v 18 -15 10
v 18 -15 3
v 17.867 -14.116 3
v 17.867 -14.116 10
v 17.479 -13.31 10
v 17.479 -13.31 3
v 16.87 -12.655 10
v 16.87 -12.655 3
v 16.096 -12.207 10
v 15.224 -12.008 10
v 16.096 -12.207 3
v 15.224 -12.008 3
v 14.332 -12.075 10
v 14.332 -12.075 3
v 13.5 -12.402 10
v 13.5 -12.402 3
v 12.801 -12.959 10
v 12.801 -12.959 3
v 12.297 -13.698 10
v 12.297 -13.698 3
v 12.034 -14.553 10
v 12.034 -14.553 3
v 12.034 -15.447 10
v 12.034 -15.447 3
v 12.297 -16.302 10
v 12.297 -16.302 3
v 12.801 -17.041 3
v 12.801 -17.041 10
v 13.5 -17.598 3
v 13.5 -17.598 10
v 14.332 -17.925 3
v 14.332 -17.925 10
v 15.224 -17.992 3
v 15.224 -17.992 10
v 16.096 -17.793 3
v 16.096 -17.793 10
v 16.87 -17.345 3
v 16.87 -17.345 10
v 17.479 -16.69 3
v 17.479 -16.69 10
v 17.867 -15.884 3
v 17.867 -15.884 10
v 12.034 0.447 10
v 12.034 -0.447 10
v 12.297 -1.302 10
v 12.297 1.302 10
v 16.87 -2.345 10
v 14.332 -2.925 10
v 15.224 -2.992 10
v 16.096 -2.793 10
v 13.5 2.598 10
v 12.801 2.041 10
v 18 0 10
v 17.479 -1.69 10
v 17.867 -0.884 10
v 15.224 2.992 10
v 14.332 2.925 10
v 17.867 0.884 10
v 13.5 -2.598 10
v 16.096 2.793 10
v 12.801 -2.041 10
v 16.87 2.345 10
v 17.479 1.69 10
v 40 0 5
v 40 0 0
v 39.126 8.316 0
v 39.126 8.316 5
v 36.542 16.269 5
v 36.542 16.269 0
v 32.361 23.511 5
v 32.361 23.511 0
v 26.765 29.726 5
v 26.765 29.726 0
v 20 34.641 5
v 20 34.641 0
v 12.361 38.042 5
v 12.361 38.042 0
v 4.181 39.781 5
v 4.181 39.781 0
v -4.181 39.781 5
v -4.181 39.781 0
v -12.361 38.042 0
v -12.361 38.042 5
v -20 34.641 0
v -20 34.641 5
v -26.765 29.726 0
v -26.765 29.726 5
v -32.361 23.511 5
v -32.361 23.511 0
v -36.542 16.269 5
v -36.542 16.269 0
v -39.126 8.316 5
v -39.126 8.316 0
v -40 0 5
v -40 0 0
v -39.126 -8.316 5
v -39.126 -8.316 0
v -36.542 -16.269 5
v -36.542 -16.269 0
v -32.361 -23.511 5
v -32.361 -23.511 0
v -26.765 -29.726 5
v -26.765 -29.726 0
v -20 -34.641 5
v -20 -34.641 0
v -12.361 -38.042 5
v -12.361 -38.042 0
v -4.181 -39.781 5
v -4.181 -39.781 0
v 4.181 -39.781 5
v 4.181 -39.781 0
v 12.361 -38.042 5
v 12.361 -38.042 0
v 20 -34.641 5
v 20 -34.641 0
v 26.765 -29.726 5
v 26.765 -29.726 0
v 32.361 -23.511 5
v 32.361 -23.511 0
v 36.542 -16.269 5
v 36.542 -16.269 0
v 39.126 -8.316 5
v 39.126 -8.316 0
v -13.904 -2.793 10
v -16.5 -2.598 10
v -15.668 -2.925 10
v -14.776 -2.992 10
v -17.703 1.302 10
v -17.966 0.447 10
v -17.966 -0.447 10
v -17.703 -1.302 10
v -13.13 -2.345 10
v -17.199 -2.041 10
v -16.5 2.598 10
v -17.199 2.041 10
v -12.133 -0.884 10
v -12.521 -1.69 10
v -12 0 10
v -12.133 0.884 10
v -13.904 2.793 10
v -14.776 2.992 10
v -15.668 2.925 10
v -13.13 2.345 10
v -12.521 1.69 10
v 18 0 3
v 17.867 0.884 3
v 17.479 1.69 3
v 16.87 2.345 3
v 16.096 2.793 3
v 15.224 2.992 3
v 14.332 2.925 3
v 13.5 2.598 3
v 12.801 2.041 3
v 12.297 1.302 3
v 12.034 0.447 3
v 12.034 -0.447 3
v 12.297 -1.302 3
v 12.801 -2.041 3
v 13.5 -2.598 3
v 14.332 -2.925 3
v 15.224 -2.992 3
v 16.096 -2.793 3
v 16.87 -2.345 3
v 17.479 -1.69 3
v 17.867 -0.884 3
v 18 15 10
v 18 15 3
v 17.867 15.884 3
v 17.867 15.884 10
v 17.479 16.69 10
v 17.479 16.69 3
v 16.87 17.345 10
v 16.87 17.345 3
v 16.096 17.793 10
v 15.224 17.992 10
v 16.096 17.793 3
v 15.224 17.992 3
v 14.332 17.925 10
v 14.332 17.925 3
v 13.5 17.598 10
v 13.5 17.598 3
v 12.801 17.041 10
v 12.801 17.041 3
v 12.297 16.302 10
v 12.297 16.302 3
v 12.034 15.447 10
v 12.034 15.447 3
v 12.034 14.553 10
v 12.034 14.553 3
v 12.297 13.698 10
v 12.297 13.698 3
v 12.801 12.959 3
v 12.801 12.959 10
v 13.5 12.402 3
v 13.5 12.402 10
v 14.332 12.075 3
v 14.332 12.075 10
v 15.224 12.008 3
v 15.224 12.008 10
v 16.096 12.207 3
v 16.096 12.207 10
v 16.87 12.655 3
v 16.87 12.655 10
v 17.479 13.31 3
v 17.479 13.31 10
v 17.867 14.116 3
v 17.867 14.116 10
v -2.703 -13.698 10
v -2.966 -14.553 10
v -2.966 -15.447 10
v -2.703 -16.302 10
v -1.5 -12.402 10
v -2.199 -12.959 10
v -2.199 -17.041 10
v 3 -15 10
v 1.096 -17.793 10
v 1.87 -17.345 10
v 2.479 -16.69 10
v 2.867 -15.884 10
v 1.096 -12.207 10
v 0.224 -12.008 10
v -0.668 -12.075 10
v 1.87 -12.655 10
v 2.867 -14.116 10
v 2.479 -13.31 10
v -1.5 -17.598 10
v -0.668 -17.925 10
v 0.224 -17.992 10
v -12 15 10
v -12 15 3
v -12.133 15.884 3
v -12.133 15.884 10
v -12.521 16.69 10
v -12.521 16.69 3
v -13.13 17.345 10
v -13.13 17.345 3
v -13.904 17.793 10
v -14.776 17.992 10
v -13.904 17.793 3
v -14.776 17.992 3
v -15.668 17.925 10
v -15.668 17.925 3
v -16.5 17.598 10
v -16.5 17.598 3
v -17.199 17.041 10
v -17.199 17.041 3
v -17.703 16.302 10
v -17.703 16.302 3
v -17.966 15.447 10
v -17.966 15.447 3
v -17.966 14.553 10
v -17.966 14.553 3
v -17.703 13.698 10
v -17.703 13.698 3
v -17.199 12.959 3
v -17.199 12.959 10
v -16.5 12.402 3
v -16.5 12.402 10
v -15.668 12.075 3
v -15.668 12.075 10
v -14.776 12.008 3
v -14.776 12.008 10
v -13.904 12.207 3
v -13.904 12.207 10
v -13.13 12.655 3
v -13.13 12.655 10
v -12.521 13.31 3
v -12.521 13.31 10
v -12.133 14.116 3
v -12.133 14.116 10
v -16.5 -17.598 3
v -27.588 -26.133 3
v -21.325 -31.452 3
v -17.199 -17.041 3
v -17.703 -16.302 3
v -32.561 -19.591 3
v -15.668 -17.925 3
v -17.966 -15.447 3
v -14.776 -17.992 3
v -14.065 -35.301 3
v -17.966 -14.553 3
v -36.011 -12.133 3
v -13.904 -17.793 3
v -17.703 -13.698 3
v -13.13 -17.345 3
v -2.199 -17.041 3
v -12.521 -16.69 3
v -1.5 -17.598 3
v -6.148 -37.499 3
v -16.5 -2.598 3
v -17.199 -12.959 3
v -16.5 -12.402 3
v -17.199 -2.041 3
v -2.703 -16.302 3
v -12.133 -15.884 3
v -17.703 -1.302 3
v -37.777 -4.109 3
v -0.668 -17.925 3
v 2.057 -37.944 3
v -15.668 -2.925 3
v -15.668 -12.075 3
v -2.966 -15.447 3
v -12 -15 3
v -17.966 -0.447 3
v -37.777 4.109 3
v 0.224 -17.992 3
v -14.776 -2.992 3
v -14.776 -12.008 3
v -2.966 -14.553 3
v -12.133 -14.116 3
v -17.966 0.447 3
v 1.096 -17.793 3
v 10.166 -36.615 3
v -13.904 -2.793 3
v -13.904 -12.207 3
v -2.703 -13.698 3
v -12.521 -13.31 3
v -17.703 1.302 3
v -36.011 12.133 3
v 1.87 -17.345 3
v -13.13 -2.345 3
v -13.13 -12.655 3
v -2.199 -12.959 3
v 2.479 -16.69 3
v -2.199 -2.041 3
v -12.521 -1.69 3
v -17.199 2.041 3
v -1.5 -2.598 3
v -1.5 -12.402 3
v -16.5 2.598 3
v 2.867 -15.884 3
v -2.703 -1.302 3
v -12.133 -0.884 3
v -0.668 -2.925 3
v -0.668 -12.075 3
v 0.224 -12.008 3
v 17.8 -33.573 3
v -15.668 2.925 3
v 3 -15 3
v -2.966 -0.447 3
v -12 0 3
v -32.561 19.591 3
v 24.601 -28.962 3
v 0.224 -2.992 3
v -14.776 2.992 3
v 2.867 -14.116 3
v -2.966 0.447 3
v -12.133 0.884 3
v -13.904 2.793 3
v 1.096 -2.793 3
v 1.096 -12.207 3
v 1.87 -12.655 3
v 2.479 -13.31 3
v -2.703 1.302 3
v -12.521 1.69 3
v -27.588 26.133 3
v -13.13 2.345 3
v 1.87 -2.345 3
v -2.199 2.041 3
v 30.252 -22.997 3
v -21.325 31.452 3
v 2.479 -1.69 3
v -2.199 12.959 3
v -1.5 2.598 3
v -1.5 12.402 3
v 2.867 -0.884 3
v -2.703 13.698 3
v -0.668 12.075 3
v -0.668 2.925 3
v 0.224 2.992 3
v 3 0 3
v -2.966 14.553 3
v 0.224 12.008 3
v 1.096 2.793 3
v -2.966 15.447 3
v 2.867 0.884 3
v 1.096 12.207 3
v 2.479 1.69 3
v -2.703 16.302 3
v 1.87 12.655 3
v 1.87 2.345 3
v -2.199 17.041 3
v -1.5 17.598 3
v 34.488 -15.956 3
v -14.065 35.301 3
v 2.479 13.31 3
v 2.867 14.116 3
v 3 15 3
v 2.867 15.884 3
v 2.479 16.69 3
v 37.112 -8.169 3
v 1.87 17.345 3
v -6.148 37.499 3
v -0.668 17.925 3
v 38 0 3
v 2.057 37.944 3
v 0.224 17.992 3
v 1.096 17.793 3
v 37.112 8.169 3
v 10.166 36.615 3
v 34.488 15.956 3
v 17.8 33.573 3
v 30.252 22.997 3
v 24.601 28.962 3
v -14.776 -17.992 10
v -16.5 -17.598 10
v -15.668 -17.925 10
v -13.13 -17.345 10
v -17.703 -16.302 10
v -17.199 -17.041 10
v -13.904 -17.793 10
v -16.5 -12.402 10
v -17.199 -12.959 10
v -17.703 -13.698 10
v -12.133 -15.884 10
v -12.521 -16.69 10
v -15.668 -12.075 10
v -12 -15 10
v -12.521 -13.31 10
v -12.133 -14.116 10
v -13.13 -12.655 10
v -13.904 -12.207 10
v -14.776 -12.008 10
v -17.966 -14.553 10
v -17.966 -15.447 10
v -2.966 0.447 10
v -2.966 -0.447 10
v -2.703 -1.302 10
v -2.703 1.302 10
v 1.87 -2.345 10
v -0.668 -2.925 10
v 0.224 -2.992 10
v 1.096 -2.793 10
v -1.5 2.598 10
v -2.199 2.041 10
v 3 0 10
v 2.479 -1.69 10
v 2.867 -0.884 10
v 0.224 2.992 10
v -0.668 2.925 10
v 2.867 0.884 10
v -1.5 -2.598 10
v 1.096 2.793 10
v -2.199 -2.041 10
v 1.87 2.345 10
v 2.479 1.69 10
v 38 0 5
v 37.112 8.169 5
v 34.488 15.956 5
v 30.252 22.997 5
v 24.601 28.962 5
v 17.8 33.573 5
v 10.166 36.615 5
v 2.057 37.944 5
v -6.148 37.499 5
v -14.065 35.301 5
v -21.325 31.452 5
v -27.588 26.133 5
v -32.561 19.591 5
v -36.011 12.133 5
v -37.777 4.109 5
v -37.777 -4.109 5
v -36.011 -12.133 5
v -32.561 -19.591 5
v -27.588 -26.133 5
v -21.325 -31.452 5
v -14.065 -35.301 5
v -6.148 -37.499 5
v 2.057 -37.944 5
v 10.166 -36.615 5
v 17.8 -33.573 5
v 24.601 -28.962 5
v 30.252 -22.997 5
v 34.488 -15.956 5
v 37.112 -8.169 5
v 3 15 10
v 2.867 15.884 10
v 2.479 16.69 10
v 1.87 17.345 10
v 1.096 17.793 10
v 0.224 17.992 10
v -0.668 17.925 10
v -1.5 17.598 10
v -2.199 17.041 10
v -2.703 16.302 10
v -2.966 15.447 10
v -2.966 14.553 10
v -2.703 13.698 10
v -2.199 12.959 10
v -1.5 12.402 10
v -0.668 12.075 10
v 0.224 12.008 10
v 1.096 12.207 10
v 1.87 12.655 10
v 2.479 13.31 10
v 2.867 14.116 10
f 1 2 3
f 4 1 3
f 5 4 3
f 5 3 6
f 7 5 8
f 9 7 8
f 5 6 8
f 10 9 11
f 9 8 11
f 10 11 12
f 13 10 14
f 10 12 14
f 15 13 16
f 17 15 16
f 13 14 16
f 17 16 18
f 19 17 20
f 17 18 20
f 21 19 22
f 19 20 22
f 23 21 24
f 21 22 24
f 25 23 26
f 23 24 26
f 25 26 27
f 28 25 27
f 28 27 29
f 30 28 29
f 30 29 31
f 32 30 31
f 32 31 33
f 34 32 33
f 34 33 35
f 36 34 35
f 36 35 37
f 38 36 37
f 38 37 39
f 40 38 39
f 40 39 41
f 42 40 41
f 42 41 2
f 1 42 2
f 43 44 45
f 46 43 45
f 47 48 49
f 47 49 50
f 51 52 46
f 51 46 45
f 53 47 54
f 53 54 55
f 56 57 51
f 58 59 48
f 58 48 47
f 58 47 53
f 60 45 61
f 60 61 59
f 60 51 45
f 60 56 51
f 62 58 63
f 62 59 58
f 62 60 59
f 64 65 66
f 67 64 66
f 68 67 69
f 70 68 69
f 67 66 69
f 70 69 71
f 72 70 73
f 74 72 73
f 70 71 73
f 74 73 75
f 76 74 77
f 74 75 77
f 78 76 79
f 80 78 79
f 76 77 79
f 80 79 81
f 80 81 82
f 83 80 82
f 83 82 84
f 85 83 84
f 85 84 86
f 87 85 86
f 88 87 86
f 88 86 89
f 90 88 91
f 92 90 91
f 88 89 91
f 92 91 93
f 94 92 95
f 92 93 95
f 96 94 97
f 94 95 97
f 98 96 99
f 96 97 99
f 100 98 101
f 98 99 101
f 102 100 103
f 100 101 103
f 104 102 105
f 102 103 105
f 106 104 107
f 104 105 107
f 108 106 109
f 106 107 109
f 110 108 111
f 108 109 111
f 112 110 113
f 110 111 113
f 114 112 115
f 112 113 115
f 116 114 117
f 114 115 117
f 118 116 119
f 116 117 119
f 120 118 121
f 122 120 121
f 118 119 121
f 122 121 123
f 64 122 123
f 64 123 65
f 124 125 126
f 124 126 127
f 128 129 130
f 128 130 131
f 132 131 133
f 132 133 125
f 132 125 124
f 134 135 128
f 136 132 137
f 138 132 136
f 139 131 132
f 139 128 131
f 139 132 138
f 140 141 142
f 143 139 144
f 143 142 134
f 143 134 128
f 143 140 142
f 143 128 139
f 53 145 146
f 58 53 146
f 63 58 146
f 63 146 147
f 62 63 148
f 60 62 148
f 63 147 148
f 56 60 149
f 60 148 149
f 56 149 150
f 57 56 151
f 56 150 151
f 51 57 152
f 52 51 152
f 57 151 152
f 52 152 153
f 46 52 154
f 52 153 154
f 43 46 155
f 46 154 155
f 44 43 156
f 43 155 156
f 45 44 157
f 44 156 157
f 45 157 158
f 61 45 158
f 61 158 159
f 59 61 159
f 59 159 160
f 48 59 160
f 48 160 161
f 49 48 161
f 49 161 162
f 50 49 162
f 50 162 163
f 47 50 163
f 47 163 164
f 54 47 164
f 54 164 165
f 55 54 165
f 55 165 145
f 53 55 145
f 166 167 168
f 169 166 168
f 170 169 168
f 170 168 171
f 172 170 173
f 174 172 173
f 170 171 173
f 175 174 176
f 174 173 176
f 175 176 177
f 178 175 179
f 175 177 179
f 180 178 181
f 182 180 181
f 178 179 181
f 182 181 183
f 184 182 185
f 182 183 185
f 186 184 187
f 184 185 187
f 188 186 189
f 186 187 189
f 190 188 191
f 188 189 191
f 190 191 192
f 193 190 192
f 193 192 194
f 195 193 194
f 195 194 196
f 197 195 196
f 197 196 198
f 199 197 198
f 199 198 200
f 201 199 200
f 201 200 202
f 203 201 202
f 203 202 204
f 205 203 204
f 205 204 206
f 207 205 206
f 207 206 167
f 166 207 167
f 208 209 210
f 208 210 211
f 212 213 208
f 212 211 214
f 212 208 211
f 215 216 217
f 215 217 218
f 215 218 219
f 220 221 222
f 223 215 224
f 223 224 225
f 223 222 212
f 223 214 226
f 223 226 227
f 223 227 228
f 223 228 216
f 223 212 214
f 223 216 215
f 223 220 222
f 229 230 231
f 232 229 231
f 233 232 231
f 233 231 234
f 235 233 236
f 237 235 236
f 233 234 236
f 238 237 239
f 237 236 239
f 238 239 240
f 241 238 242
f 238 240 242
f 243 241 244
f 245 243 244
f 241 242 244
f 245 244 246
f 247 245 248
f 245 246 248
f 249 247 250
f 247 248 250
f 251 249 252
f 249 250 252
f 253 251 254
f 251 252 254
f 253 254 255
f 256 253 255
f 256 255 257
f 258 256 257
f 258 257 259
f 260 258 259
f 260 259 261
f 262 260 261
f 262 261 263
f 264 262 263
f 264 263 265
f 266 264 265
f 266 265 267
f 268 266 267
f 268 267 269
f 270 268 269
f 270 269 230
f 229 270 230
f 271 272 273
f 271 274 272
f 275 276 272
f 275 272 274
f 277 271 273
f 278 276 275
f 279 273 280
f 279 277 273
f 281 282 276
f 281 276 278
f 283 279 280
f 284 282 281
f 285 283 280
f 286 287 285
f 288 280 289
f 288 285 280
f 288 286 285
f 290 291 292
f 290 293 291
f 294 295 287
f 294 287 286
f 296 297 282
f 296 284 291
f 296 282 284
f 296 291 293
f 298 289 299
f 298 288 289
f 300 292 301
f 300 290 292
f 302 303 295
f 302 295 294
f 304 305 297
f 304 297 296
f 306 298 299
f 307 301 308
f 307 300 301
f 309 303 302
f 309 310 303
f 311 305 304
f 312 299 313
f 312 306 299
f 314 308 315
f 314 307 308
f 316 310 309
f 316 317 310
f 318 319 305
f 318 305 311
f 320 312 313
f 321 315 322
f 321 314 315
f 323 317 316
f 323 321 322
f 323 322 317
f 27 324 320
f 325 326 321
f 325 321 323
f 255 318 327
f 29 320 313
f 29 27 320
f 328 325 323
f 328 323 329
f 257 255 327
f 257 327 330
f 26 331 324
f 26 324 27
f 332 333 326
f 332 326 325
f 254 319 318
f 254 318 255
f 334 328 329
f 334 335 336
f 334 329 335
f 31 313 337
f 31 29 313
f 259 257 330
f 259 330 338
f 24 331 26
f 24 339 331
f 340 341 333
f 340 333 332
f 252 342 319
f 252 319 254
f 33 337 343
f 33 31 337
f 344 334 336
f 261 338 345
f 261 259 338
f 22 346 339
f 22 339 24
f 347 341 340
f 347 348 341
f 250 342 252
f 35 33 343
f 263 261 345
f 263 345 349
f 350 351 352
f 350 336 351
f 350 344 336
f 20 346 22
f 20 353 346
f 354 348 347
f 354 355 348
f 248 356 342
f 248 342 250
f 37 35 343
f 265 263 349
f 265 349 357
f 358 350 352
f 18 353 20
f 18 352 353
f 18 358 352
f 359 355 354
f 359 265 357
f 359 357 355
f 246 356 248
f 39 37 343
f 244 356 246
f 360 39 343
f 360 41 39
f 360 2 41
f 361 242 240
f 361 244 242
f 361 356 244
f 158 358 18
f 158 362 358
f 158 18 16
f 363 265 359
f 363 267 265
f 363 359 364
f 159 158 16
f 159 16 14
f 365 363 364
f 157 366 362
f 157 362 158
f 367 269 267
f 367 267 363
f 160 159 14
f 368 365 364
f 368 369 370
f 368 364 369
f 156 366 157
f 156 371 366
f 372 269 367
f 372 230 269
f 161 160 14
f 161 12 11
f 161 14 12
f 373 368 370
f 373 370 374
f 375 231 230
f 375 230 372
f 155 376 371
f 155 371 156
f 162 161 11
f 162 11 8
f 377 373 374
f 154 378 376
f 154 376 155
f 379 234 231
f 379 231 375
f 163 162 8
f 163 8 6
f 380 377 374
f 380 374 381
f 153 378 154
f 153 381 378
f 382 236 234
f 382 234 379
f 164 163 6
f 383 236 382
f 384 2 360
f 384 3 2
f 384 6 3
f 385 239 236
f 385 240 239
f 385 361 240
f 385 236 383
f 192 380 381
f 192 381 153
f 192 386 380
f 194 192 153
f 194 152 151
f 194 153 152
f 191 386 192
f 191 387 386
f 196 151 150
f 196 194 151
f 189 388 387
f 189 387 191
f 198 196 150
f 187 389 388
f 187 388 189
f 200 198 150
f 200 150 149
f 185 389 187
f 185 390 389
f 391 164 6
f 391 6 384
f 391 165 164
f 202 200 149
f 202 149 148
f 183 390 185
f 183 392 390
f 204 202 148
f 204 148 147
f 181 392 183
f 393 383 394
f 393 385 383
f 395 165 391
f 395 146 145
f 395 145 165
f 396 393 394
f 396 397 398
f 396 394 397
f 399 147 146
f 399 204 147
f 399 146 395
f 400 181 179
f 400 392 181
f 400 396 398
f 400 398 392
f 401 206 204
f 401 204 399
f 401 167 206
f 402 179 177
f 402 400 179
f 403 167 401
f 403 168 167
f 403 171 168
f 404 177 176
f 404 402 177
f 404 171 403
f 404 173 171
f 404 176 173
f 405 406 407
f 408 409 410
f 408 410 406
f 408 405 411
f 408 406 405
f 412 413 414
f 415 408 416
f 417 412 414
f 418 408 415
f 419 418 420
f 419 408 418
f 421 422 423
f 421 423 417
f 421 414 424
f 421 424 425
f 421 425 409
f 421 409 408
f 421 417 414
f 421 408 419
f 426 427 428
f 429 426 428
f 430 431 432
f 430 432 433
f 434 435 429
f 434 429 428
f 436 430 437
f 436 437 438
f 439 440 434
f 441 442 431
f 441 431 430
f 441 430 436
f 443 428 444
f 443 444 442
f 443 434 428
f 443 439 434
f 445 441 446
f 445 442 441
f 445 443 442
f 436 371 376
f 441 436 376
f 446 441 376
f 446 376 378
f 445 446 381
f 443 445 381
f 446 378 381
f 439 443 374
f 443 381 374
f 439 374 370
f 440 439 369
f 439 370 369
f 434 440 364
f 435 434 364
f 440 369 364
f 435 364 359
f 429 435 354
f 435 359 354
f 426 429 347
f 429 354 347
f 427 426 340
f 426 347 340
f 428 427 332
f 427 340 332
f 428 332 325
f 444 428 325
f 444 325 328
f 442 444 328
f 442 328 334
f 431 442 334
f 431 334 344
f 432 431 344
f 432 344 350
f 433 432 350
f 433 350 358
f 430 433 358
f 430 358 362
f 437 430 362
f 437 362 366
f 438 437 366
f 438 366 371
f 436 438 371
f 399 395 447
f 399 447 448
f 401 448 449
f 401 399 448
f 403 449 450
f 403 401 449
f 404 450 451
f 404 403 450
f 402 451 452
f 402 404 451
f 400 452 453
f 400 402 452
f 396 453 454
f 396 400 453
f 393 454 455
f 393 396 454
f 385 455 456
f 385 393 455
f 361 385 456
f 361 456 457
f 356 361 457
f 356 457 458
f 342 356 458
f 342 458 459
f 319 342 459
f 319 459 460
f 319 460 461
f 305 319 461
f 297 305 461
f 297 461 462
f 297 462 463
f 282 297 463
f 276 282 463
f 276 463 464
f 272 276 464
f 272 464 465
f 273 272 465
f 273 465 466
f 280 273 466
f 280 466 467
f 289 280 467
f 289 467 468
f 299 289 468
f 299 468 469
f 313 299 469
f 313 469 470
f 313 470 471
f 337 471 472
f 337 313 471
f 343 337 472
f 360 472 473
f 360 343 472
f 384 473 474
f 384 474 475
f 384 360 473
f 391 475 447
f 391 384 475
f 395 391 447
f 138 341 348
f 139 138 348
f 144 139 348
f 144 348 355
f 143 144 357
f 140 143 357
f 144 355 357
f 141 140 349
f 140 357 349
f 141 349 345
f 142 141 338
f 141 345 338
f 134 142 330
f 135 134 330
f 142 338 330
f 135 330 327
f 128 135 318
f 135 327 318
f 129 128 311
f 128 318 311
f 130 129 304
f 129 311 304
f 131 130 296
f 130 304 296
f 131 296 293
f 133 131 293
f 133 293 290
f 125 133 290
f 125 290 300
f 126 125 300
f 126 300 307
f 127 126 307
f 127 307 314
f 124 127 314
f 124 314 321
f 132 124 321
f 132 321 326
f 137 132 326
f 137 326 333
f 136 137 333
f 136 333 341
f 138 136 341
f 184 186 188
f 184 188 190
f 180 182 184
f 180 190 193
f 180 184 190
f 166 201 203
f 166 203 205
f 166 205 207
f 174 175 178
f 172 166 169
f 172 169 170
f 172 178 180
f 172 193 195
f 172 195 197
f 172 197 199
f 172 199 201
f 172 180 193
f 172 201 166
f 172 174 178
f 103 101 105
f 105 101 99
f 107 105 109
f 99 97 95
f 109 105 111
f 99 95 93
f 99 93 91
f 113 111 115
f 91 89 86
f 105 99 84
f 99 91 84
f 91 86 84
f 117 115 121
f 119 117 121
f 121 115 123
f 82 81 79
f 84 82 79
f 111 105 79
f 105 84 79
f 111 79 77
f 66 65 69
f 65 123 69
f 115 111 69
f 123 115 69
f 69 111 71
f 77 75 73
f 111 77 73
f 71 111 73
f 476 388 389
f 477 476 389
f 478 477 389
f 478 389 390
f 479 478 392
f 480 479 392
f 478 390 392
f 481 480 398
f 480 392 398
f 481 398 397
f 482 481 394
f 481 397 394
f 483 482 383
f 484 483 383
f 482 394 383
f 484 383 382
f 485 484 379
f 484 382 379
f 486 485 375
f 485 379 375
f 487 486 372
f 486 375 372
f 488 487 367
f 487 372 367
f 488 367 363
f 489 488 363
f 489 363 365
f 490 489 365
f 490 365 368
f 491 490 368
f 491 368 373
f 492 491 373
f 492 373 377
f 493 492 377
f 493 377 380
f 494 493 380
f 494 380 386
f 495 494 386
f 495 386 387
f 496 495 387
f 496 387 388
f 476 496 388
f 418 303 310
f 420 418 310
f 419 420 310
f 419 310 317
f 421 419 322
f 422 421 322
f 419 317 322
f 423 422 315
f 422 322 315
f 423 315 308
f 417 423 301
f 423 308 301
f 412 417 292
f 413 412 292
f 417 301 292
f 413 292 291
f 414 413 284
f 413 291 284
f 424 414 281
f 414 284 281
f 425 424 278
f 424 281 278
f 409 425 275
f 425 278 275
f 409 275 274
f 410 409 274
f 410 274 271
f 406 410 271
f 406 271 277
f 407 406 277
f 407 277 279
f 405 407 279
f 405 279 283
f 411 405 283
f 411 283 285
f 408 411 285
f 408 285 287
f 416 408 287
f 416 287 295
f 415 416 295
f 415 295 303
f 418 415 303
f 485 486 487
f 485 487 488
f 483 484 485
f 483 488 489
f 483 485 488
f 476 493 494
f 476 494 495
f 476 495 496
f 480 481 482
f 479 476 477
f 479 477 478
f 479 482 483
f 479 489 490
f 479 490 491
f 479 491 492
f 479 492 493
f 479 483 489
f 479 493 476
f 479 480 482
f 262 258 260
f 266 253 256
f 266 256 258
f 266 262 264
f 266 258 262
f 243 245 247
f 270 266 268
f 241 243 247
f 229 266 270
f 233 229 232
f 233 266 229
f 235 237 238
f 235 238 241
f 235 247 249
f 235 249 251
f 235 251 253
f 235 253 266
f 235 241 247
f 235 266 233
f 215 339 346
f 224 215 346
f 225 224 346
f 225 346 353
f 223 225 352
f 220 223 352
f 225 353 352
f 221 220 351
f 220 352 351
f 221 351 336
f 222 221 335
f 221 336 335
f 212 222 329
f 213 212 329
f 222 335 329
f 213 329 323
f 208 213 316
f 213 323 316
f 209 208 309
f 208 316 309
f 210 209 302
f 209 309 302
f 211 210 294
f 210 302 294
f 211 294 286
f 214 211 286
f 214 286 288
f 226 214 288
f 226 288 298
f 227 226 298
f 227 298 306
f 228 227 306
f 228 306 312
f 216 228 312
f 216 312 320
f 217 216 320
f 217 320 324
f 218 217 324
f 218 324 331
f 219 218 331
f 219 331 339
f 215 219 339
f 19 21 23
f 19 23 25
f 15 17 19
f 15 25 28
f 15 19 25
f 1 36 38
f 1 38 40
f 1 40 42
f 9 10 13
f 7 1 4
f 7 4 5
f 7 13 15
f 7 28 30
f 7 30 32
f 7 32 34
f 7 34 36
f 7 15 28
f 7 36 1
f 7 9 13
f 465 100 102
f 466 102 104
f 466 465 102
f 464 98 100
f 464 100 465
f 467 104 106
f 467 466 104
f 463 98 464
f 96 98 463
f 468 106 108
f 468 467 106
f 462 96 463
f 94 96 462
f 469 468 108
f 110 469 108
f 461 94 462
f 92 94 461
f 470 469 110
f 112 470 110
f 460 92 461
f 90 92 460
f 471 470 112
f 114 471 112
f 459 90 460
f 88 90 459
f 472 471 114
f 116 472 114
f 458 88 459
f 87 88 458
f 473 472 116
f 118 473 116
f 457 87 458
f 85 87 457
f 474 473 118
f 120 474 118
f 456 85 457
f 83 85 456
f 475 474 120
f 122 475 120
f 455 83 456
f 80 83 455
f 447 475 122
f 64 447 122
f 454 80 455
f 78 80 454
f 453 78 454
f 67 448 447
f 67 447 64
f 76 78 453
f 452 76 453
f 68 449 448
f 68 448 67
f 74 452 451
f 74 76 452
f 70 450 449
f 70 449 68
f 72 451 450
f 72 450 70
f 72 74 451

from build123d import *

# Parameters (mm, degrees)
F0_R     = 38
F0_R_2   = 3
F1_DEPTH = 3
F2_DEPTH = 10
F0_R_3   = 40
F3_DEPTH = 5


with BuildPart() as f1:
    # F0 (on Top) → F1 (new body)
    with BuildSketch(Plane.XY):
        Circle(F0_R)
        with Locations((-15, -15)):
            Circle(F0_R_2, mode=Mode.SUBTRACT)
        with Locations((0, -15)):
            Circle(F0_R_2, mode=Mode.SUBTRACT)
        with Locations((15, -15)):
            Circle(F0_R_2, mode=Mode.SUBTRACT)
        with Locations((-15, 0)):
            Circle(F0_R_2, mode=Mode.SUBTRACT)
        with Locations((-15, 15)):
            Circle(F0_R_2, mode=Mode.SUBTRACT)
        Circle(F0_R_2, mode=Mode.SUBTRACT)
        with Locations((15, 0)):
            Circle(F0_R_2, mode=Mode.SUBTRACT)
        with Locations((0, 15)):
            Circle(F0_R_2, mode=Mode.SUBTRACT)
        with Locations((15, 15)):
            Circle(F0_R_2, mode=Mode.SUBTRACT)
    extrude(amount=F1_DEPTH)

    # F0 (on Top) → F2 (join)
    with BuildSketch(Plane.XY):
        with Locations((0, 15)):
            Circle(F0_R_2)
        with Locations((-15, 0)):
            Circle(F0_R_2)
        with Locations((0, -15)):
            Circle(F0_R_2)
        with Locations((15, 0)):
            Circle(F0_R_2)
        with Locations((-15, 15)):
            Circle(F0_R_2)
        with Locations((15, 15)):
            Circle(F0_R_2)
        with Locations((15, -15)):
            Circle(F0_R_2)
        Circle(F0_R_2)
        with Locations((-15, -15)):
            Circle(F0_R_2)
    extrude(amount=F2_DEPTH)

    # F0 (on Top) → F3 (join)
    with BuildSketch(Plane.XY):
        Circle(F0_R_3)
        Circle(F0_R, mode=Mode.SUBTRACT)
    extrude(amount=F3_DEPTH)


solid = f1.part
